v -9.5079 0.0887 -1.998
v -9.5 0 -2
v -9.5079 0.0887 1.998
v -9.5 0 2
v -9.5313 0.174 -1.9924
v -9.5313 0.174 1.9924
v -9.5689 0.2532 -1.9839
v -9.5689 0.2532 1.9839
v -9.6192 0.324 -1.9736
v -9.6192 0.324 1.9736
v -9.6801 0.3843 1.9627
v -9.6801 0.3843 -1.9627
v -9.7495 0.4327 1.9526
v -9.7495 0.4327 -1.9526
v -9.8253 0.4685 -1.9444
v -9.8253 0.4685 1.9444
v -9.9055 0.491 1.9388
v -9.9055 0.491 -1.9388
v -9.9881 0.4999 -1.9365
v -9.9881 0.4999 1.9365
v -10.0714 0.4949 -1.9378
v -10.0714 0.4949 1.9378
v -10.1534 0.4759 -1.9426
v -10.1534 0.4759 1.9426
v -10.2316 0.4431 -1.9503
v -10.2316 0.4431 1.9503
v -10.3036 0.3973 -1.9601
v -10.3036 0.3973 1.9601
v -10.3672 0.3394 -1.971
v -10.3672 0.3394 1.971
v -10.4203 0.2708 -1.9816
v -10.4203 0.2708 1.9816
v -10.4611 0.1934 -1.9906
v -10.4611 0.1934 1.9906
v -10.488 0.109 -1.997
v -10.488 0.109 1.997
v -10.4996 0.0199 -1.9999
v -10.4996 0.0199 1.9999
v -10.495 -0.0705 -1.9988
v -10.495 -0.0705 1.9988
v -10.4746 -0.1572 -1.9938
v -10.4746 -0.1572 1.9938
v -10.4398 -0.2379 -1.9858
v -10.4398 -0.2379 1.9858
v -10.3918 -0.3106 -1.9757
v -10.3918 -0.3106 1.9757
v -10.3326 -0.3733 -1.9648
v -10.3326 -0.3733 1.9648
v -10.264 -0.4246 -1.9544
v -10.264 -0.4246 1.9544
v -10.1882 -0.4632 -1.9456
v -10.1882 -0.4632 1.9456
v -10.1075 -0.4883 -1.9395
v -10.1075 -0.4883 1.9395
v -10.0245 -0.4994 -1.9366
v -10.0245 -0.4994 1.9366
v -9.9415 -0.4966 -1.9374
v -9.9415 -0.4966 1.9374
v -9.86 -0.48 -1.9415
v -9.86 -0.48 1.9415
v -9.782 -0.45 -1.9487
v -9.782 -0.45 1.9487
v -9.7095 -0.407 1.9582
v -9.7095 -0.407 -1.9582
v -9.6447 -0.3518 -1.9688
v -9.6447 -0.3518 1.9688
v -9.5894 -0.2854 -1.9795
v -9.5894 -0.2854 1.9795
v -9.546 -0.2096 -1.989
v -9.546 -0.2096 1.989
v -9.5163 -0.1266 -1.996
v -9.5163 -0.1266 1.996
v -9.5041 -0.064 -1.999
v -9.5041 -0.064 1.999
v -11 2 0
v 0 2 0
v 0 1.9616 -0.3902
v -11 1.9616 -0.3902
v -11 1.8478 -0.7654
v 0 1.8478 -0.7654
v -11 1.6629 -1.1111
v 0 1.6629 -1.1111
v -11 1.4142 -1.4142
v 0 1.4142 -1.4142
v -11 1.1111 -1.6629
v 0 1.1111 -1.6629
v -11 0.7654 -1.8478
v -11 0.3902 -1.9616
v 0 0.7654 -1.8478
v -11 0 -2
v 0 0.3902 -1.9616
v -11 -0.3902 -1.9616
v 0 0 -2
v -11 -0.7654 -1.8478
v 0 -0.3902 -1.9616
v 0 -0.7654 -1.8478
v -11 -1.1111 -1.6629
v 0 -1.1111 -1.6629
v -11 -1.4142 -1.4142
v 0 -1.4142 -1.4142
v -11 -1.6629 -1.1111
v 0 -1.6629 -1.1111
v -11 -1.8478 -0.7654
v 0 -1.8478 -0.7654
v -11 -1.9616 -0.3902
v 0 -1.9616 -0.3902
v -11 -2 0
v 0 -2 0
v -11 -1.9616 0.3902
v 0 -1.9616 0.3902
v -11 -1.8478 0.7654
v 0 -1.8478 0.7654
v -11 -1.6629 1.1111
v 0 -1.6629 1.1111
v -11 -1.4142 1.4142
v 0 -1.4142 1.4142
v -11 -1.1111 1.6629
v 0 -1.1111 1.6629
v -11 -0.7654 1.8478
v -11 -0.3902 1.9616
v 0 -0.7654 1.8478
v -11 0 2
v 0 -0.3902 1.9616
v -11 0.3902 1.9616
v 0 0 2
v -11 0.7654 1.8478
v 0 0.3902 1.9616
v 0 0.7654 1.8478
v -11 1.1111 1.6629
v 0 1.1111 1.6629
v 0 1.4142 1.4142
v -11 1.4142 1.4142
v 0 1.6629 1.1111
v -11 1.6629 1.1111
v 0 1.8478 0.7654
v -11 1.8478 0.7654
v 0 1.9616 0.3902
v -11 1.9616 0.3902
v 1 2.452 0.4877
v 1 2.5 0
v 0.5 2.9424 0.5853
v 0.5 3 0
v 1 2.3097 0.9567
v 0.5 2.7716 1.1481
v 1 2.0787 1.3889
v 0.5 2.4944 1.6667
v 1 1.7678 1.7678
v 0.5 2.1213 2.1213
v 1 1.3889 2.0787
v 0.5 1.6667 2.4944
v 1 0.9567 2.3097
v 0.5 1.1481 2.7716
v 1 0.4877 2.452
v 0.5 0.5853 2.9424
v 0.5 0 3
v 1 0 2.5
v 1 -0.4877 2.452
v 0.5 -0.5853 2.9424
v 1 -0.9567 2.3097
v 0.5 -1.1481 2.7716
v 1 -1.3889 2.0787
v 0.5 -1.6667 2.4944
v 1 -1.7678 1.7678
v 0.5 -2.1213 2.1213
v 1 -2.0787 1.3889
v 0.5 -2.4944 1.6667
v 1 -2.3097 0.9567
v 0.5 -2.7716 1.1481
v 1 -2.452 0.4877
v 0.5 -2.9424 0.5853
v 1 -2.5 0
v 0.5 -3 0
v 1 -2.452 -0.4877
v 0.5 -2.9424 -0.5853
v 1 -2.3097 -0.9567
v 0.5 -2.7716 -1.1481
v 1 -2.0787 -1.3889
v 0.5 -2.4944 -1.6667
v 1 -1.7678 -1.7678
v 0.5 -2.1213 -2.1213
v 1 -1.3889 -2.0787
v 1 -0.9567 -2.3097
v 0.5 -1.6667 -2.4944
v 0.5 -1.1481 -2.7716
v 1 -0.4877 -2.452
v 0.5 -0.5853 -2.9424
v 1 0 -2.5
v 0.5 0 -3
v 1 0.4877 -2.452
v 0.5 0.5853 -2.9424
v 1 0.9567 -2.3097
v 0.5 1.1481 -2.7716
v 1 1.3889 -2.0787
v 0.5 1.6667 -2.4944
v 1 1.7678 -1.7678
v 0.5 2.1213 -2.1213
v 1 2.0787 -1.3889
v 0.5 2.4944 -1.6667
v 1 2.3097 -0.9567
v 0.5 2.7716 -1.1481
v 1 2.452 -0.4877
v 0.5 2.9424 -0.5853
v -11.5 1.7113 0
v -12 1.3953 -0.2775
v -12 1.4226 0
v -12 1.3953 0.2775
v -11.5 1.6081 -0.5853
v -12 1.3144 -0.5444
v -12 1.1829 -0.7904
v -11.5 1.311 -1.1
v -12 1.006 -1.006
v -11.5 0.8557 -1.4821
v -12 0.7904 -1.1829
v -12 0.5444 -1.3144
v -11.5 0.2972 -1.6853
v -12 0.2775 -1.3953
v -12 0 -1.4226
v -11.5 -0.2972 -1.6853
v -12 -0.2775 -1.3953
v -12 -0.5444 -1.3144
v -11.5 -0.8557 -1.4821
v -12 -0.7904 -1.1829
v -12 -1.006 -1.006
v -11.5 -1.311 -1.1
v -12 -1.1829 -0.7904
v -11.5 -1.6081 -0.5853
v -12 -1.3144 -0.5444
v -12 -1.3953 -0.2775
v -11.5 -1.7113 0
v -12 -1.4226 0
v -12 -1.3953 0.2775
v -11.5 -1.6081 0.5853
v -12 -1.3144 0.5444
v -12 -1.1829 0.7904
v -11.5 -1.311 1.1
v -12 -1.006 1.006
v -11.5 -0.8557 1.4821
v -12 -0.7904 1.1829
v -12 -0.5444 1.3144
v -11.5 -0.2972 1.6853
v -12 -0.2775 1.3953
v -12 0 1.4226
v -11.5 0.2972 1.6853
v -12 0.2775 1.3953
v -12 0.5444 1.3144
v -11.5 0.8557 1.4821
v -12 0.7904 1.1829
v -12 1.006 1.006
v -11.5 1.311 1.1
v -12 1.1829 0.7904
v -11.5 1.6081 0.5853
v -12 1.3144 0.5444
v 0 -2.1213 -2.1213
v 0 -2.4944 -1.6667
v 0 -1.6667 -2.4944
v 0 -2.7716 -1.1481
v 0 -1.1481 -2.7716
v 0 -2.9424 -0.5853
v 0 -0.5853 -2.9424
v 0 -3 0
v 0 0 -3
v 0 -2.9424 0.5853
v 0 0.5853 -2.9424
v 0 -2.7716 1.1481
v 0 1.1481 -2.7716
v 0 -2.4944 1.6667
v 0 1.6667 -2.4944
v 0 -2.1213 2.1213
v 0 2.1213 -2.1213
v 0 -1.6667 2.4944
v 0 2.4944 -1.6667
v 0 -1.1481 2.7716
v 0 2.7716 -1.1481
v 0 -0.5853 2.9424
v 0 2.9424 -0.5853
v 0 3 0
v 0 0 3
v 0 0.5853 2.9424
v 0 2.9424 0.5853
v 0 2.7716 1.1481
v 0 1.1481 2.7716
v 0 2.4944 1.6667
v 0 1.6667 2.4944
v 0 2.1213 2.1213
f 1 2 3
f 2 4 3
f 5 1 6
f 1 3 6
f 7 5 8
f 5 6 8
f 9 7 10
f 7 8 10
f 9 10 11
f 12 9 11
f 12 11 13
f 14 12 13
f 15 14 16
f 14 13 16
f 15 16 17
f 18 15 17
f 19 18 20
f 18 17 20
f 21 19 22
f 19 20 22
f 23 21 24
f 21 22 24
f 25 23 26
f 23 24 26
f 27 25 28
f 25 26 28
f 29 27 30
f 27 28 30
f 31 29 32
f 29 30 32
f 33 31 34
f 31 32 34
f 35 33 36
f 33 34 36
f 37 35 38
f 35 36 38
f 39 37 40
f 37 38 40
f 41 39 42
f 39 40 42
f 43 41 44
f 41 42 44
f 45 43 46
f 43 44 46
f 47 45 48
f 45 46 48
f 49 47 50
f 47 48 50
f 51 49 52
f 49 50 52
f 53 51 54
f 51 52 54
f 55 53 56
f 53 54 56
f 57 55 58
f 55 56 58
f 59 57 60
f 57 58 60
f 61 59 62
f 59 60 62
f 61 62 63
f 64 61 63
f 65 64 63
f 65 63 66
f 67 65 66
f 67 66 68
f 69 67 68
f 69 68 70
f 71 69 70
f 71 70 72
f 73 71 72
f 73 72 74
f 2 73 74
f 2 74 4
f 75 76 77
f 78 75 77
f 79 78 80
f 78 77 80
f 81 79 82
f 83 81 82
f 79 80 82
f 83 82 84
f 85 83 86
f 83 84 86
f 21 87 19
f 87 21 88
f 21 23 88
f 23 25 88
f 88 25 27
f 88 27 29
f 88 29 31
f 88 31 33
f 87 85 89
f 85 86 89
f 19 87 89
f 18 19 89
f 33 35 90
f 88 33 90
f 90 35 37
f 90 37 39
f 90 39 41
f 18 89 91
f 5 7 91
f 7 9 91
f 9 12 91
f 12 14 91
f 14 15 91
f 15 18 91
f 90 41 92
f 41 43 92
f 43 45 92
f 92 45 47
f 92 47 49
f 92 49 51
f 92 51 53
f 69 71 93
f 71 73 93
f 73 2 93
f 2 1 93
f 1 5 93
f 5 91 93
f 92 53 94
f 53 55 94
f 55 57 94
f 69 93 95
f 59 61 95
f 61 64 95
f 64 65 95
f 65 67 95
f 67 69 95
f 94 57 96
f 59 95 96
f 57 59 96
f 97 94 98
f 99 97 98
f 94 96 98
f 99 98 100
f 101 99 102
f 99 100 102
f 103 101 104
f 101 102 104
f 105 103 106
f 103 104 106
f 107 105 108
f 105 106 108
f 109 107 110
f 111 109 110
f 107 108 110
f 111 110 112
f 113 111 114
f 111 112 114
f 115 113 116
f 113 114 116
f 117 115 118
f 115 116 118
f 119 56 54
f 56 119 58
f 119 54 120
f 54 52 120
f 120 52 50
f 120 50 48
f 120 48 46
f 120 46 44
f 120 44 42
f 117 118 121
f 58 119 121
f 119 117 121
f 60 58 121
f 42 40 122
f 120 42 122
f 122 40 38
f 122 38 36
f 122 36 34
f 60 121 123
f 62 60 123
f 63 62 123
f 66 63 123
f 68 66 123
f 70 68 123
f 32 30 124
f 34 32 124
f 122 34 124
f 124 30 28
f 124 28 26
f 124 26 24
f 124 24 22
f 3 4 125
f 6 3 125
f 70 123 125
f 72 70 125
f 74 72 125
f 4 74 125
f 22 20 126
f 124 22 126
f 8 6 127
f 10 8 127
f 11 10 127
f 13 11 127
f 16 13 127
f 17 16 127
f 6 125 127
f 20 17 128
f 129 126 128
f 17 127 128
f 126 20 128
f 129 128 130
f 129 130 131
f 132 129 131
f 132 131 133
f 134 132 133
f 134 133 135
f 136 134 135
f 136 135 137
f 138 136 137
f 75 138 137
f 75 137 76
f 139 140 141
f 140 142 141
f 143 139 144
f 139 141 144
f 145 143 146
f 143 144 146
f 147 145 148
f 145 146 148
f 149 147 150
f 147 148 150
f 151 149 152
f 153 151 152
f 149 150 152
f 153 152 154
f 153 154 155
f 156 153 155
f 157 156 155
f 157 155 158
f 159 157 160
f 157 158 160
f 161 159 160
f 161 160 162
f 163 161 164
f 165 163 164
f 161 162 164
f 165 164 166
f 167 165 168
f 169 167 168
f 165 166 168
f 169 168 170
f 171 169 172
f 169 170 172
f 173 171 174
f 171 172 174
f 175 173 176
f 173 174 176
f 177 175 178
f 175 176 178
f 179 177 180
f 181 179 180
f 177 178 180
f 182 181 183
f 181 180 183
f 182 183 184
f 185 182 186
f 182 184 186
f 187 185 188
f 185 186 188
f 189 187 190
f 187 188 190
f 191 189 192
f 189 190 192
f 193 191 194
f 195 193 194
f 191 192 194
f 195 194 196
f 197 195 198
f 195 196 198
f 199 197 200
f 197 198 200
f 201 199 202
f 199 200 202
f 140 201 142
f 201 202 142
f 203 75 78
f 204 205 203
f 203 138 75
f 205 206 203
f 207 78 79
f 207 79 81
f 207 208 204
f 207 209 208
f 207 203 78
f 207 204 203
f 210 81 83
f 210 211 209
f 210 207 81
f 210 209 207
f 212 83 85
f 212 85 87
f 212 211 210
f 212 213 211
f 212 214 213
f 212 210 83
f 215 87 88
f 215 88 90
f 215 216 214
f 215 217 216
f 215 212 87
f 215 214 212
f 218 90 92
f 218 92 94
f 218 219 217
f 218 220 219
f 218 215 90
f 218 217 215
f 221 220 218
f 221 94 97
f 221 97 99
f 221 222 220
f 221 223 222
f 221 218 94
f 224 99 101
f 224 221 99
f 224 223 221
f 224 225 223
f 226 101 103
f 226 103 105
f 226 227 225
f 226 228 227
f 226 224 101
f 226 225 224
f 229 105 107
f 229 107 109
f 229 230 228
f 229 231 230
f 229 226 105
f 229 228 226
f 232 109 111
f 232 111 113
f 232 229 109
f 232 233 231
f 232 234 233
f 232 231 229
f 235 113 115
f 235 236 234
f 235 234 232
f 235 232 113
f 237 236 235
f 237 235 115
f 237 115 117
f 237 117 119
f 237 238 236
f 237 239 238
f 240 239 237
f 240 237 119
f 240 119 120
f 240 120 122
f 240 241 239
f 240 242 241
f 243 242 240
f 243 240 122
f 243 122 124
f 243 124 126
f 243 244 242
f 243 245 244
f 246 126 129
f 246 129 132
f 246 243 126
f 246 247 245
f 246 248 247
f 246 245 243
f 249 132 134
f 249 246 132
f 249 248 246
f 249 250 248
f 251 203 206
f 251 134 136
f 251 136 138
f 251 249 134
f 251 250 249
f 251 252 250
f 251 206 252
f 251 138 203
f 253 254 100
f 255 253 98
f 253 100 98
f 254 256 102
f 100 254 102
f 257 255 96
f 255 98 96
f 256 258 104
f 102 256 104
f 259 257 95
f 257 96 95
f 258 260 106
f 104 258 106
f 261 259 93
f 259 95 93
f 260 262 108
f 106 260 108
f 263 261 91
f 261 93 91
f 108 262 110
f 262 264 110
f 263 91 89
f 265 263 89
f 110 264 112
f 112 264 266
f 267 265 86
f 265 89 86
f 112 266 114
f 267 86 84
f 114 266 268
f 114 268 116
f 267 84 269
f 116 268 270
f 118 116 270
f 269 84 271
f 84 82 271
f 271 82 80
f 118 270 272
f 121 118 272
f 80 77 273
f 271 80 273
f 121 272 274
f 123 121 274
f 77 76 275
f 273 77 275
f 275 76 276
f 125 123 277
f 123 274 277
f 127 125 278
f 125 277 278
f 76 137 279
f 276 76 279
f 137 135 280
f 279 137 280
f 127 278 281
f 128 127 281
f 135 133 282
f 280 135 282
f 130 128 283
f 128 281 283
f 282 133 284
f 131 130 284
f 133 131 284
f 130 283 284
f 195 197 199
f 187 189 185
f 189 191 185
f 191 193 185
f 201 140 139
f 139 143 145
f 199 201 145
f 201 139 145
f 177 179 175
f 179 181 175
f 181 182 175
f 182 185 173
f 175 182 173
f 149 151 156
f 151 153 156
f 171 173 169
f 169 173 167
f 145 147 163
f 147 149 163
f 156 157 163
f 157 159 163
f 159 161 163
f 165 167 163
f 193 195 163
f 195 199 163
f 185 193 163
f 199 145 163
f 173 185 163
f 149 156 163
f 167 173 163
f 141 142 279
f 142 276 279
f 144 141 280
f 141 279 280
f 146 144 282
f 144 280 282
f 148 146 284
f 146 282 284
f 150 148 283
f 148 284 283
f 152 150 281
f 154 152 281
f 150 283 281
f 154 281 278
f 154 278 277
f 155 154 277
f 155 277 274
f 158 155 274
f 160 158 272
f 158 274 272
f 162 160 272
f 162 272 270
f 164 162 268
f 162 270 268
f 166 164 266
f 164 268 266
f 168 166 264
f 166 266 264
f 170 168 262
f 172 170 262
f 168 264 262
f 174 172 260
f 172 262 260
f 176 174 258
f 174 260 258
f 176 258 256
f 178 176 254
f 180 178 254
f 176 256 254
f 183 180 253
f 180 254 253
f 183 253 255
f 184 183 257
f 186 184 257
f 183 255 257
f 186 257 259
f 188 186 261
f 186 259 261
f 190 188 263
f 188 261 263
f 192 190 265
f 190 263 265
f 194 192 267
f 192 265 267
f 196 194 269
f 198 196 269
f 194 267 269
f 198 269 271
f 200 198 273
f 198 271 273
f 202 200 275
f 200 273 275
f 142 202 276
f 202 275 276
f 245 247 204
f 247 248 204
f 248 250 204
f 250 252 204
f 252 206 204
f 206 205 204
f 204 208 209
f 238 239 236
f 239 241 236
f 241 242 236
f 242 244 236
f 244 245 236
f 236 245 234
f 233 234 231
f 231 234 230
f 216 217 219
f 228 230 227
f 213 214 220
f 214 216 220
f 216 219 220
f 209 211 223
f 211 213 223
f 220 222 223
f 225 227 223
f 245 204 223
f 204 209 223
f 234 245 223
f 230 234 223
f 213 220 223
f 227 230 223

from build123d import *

# Parameters (mm, degrees)
SKETCH1_W              = 12
SKETCH1_H              = 2
HEAD_CHAMFER_SIZE      = 1
HEAD_CHAMFER_SIZE2     = 0.577350269
SKETCH21_R             = 0.5
R_CLIP_HOLE_DEPTH      = 4
R_CLIP_HOLE_DEPTH_BACK = 4


with BuildPart() as part:
    # Sketch1 → Body Revolve (revolve)
    with BuildSketch(Plane.XY):
        with Locations((-6, 1)):
            Rectangle(SKETCH1_W, SKETCH1_H)
    revolve(axis=Axis((0, 0, 0), (-1, 0, 0)))

    # Sketch14 → Head Revolve (revolve)
    with BuildSketch(Plane.XY):
        Polygon((0, 0), (1, 0), (1, 2.5), (0.5, 3), (0, 3), align=None)
    revolve(axis=Axis((0, 0, 0), (1, 0, 0)))

    # Head Chamfer
    head_chamfer_edges = [part.edges().sort_by_distance(p)[0] for p in [
        (-12, -2, 0),
    ]]
    head_chamfer_side = [part.faces().sort_by_distance(p)[0] for p in [
        (-6, -2, 0),
    ]]
    chamfer(head_chamfer_edges, length=HEAD_CHAMFER_SIZE, length2=HEAD_CHAMFER_SIZE2, reference=head_chamfer_side[0])

    # Sketch21 → R Clip Hole (cut, two sides)
    with BuildSketch(Plane.XY) as r_clip_hole_sk:
        with Locations((-10, 0)):
            Circle(SKETCH21_R)
    extrude(amount=R_CLIP_HOLE_DEPTH, mode=Mode.SUBTRACT)
    extrude(r_clip_hole_sk.sketch, amount=-R_CLIP_HOLE_DEPTH_BACK, mode=Mode.SUBTRACT)


solid = part.part
